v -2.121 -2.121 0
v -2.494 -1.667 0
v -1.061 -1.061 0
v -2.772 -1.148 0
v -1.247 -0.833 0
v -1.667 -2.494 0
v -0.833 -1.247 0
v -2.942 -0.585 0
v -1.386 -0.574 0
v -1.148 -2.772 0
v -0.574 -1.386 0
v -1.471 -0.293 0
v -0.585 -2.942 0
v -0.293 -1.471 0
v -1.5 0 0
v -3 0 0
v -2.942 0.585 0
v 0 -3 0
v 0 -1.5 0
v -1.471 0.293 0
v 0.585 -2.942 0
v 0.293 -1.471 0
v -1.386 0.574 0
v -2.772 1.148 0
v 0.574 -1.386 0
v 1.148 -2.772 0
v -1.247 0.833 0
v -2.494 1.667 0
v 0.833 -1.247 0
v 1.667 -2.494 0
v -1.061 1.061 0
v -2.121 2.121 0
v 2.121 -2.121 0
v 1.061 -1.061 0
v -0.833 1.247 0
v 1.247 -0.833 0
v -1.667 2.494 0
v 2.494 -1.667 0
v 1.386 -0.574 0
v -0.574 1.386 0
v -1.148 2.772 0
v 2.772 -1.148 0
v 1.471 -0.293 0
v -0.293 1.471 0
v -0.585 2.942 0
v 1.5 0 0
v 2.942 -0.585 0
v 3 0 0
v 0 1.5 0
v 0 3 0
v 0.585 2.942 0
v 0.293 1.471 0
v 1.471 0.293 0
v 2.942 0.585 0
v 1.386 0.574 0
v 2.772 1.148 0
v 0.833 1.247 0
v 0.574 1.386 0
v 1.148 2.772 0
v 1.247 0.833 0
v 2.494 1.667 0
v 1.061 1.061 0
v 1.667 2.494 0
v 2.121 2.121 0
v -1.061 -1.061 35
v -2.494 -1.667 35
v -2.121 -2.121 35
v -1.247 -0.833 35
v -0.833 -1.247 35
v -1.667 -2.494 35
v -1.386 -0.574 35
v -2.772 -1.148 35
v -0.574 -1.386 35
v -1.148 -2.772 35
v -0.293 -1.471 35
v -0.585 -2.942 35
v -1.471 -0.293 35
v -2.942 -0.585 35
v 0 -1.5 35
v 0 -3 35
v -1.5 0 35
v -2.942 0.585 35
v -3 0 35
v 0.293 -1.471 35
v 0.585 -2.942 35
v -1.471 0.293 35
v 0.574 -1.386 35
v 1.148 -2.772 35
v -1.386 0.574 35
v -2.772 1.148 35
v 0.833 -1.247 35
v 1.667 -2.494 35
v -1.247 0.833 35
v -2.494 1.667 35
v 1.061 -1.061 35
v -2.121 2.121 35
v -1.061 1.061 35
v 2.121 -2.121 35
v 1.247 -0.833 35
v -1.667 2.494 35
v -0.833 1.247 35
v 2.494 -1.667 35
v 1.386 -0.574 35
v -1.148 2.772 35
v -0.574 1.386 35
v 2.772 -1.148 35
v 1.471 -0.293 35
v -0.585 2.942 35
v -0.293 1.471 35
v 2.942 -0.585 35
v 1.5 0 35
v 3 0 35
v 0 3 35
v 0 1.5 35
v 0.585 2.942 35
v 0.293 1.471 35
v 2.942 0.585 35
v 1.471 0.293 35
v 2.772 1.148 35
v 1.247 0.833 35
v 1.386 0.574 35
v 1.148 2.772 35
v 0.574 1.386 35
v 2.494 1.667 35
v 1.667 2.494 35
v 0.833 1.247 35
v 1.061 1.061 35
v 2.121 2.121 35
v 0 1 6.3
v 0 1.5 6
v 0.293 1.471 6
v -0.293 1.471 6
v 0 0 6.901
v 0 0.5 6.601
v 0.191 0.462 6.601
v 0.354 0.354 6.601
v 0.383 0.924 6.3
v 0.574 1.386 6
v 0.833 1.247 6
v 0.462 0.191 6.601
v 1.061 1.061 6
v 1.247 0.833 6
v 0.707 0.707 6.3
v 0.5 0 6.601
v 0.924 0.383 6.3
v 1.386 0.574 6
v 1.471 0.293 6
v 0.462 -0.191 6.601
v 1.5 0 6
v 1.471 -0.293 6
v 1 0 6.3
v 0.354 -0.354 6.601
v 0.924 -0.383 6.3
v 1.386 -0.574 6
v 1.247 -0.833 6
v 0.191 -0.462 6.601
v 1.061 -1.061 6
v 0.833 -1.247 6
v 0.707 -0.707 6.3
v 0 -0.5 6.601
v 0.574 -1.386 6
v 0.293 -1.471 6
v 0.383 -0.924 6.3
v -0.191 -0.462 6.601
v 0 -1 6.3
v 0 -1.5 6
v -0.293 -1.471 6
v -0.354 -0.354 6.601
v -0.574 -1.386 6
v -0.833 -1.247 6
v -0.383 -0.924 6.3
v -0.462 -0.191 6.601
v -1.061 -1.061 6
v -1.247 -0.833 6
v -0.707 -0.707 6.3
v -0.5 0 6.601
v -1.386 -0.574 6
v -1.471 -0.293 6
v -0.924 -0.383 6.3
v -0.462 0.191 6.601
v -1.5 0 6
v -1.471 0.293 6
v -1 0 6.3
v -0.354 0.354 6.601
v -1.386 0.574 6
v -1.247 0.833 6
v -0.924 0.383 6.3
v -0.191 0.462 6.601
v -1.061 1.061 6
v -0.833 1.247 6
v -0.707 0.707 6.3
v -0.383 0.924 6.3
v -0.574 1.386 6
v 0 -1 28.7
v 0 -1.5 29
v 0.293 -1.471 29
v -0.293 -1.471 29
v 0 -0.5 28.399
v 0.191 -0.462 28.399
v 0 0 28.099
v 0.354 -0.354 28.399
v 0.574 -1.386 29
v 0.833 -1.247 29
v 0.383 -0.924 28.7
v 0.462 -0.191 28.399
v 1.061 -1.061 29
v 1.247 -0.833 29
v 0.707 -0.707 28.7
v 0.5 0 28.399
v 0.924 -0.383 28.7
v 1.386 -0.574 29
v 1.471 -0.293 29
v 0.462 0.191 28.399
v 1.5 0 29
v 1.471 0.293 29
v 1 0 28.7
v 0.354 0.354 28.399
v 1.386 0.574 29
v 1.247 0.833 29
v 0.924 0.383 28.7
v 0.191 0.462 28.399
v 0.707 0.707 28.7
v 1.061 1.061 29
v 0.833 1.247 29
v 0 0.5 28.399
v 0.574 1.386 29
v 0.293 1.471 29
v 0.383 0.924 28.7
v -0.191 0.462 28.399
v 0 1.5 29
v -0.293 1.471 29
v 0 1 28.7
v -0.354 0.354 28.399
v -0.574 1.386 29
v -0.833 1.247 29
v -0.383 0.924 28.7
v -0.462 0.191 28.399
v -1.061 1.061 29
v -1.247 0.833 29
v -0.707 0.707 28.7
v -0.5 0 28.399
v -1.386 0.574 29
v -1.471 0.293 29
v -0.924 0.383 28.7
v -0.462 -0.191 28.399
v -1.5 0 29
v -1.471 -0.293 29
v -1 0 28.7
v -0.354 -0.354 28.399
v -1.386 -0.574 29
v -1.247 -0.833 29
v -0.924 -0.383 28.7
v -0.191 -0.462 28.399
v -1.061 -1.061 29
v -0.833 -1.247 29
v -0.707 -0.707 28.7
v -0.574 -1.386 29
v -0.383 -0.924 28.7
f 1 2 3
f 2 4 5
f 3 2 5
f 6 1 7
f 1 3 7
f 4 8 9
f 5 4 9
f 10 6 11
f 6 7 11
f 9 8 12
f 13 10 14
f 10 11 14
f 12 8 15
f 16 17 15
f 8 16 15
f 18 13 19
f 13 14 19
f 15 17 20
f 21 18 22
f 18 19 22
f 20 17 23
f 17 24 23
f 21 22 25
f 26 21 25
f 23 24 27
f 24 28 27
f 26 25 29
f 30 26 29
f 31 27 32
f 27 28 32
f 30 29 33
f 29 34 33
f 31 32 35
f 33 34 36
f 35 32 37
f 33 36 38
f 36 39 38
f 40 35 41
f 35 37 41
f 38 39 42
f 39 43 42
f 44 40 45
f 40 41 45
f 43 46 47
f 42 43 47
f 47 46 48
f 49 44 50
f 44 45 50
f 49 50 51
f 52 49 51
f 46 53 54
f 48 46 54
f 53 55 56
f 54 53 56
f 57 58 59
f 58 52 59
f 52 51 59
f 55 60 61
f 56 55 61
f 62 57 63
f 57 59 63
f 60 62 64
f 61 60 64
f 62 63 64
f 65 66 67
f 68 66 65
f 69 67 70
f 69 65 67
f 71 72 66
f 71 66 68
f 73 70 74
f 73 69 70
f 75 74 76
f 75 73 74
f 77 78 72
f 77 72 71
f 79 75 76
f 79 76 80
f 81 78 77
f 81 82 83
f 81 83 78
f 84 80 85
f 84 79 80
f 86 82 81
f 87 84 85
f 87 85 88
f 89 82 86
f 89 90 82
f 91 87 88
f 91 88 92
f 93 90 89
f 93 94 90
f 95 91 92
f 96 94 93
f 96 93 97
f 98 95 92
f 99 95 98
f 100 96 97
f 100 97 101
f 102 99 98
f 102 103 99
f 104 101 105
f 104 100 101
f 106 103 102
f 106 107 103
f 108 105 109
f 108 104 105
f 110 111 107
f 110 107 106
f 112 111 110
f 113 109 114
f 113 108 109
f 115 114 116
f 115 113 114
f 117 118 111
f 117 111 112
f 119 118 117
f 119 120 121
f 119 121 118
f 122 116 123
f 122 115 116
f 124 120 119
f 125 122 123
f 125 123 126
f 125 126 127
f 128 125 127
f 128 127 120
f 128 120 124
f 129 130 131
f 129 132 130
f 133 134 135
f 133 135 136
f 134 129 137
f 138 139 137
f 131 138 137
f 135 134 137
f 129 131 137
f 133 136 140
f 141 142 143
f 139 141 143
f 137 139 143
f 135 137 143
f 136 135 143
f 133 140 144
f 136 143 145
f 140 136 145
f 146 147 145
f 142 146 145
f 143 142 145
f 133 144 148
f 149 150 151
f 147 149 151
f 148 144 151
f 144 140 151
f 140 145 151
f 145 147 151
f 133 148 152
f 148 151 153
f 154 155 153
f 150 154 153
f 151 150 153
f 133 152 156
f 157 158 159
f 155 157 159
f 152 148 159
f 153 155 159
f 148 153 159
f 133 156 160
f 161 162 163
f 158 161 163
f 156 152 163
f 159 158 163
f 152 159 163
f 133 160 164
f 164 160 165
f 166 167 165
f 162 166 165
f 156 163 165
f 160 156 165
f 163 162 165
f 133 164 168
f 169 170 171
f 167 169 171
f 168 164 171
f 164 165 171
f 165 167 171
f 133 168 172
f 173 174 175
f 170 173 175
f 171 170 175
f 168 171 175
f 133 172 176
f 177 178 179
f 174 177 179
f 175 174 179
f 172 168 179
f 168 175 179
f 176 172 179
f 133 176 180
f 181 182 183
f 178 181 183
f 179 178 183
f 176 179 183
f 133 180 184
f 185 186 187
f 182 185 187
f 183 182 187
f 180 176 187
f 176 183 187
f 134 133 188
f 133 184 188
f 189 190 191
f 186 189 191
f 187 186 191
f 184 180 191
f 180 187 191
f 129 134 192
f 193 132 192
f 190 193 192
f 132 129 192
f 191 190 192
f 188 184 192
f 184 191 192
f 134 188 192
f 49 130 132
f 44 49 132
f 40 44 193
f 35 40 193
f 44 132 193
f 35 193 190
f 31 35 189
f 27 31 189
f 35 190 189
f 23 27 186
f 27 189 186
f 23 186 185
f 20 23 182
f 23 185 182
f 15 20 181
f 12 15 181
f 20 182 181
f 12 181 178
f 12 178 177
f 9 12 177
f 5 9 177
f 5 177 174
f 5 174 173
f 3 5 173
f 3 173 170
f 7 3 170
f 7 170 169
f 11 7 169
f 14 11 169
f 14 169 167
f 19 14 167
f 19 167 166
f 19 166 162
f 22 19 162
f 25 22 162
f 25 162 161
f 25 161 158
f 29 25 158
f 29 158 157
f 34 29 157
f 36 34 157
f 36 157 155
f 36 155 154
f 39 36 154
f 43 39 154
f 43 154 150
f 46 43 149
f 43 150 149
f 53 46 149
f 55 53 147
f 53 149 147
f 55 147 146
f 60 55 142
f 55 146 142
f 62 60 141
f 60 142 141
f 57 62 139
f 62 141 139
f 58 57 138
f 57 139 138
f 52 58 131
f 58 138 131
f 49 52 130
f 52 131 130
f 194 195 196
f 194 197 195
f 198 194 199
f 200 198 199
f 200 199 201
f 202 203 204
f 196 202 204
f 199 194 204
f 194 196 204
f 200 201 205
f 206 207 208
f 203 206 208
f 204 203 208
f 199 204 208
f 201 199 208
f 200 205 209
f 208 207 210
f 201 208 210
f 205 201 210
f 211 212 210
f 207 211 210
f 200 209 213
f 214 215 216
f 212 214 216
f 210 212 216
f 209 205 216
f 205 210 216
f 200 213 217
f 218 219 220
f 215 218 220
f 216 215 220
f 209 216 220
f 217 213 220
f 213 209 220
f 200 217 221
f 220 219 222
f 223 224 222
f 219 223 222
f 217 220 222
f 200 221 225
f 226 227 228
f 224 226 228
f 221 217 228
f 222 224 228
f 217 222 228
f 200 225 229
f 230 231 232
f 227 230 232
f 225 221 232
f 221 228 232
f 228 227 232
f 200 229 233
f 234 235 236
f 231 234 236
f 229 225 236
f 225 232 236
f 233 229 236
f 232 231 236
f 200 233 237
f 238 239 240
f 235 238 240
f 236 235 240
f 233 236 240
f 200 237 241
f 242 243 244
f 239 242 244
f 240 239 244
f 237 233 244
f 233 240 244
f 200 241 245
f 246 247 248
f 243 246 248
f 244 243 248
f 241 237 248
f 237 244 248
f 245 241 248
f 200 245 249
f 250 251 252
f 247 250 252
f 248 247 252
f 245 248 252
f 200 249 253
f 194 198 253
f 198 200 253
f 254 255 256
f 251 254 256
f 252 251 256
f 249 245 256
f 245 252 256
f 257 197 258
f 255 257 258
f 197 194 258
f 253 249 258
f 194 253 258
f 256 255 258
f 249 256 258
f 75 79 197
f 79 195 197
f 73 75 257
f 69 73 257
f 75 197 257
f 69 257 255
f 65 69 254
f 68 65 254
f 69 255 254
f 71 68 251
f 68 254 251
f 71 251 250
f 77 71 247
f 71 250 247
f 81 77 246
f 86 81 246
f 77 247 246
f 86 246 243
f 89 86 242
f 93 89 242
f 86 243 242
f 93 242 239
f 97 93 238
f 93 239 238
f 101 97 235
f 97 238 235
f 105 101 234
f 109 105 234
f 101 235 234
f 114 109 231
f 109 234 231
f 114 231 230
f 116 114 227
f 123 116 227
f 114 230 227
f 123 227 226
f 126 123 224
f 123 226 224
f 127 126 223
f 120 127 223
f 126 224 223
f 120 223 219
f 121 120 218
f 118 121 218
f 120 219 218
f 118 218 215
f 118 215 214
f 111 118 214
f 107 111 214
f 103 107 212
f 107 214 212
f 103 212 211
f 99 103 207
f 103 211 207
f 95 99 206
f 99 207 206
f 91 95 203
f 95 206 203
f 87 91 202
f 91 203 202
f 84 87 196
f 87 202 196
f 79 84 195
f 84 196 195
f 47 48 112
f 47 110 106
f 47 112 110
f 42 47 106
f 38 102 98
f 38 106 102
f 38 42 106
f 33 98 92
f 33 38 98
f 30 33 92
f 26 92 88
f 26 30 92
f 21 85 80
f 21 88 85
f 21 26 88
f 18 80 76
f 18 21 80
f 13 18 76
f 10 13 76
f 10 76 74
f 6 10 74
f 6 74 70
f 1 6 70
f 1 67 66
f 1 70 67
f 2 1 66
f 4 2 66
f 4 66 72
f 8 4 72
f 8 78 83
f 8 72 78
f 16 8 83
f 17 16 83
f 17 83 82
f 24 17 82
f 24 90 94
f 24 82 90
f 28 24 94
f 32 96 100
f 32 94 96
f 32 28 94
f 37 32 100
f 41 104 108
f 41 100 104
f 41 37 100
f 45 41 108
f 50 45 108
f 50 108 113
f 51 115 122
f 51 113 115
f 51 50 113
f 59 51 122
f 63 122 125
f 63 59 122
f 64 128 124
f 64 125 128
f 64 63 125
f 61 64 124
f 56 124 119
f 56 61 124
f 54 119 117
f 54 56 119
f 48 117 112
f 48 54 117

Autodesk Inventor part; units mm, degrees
ref_plane "YZ Plane" through (0, 0, 0) normal (1, 0, 0) x (0, 1, 0)
ref_plane "XZ Plane" through (0, 0, 0) normal (0, 1, 0) x (-1, 0, 0)
ref_plane "XY Plane" through (0, 0, 0) normal (0, 0, 1) x (1, 0, 0)
sketch "スケッチ1" plane through (0, 0, 0) normal (0, 0, 1) x (1, 0, 0)
  circle A0 centre (0, 0) radius 3
  dimension "d0" = 6
extrude "押し出し1" add sketch "スケッチ1" along normal blind 35
hole "穴1" at (0, 0, 0) direction (0, 0, 1) diameter 3 depth 6 tip angle 118
sketch "スケッチ2" plane through (0, 0, 35) normal (0, 0, 1) x (1, 0, 0)
  circle A0 centre (0, 0) radius 3 projected
hole "穴2" at (0, 0, 35) direction (0, 0, -1) diameter 3 depth 6 tip angle 118
properties part number "スペーサ　l35" material "アルミニウム 2014-T4"
